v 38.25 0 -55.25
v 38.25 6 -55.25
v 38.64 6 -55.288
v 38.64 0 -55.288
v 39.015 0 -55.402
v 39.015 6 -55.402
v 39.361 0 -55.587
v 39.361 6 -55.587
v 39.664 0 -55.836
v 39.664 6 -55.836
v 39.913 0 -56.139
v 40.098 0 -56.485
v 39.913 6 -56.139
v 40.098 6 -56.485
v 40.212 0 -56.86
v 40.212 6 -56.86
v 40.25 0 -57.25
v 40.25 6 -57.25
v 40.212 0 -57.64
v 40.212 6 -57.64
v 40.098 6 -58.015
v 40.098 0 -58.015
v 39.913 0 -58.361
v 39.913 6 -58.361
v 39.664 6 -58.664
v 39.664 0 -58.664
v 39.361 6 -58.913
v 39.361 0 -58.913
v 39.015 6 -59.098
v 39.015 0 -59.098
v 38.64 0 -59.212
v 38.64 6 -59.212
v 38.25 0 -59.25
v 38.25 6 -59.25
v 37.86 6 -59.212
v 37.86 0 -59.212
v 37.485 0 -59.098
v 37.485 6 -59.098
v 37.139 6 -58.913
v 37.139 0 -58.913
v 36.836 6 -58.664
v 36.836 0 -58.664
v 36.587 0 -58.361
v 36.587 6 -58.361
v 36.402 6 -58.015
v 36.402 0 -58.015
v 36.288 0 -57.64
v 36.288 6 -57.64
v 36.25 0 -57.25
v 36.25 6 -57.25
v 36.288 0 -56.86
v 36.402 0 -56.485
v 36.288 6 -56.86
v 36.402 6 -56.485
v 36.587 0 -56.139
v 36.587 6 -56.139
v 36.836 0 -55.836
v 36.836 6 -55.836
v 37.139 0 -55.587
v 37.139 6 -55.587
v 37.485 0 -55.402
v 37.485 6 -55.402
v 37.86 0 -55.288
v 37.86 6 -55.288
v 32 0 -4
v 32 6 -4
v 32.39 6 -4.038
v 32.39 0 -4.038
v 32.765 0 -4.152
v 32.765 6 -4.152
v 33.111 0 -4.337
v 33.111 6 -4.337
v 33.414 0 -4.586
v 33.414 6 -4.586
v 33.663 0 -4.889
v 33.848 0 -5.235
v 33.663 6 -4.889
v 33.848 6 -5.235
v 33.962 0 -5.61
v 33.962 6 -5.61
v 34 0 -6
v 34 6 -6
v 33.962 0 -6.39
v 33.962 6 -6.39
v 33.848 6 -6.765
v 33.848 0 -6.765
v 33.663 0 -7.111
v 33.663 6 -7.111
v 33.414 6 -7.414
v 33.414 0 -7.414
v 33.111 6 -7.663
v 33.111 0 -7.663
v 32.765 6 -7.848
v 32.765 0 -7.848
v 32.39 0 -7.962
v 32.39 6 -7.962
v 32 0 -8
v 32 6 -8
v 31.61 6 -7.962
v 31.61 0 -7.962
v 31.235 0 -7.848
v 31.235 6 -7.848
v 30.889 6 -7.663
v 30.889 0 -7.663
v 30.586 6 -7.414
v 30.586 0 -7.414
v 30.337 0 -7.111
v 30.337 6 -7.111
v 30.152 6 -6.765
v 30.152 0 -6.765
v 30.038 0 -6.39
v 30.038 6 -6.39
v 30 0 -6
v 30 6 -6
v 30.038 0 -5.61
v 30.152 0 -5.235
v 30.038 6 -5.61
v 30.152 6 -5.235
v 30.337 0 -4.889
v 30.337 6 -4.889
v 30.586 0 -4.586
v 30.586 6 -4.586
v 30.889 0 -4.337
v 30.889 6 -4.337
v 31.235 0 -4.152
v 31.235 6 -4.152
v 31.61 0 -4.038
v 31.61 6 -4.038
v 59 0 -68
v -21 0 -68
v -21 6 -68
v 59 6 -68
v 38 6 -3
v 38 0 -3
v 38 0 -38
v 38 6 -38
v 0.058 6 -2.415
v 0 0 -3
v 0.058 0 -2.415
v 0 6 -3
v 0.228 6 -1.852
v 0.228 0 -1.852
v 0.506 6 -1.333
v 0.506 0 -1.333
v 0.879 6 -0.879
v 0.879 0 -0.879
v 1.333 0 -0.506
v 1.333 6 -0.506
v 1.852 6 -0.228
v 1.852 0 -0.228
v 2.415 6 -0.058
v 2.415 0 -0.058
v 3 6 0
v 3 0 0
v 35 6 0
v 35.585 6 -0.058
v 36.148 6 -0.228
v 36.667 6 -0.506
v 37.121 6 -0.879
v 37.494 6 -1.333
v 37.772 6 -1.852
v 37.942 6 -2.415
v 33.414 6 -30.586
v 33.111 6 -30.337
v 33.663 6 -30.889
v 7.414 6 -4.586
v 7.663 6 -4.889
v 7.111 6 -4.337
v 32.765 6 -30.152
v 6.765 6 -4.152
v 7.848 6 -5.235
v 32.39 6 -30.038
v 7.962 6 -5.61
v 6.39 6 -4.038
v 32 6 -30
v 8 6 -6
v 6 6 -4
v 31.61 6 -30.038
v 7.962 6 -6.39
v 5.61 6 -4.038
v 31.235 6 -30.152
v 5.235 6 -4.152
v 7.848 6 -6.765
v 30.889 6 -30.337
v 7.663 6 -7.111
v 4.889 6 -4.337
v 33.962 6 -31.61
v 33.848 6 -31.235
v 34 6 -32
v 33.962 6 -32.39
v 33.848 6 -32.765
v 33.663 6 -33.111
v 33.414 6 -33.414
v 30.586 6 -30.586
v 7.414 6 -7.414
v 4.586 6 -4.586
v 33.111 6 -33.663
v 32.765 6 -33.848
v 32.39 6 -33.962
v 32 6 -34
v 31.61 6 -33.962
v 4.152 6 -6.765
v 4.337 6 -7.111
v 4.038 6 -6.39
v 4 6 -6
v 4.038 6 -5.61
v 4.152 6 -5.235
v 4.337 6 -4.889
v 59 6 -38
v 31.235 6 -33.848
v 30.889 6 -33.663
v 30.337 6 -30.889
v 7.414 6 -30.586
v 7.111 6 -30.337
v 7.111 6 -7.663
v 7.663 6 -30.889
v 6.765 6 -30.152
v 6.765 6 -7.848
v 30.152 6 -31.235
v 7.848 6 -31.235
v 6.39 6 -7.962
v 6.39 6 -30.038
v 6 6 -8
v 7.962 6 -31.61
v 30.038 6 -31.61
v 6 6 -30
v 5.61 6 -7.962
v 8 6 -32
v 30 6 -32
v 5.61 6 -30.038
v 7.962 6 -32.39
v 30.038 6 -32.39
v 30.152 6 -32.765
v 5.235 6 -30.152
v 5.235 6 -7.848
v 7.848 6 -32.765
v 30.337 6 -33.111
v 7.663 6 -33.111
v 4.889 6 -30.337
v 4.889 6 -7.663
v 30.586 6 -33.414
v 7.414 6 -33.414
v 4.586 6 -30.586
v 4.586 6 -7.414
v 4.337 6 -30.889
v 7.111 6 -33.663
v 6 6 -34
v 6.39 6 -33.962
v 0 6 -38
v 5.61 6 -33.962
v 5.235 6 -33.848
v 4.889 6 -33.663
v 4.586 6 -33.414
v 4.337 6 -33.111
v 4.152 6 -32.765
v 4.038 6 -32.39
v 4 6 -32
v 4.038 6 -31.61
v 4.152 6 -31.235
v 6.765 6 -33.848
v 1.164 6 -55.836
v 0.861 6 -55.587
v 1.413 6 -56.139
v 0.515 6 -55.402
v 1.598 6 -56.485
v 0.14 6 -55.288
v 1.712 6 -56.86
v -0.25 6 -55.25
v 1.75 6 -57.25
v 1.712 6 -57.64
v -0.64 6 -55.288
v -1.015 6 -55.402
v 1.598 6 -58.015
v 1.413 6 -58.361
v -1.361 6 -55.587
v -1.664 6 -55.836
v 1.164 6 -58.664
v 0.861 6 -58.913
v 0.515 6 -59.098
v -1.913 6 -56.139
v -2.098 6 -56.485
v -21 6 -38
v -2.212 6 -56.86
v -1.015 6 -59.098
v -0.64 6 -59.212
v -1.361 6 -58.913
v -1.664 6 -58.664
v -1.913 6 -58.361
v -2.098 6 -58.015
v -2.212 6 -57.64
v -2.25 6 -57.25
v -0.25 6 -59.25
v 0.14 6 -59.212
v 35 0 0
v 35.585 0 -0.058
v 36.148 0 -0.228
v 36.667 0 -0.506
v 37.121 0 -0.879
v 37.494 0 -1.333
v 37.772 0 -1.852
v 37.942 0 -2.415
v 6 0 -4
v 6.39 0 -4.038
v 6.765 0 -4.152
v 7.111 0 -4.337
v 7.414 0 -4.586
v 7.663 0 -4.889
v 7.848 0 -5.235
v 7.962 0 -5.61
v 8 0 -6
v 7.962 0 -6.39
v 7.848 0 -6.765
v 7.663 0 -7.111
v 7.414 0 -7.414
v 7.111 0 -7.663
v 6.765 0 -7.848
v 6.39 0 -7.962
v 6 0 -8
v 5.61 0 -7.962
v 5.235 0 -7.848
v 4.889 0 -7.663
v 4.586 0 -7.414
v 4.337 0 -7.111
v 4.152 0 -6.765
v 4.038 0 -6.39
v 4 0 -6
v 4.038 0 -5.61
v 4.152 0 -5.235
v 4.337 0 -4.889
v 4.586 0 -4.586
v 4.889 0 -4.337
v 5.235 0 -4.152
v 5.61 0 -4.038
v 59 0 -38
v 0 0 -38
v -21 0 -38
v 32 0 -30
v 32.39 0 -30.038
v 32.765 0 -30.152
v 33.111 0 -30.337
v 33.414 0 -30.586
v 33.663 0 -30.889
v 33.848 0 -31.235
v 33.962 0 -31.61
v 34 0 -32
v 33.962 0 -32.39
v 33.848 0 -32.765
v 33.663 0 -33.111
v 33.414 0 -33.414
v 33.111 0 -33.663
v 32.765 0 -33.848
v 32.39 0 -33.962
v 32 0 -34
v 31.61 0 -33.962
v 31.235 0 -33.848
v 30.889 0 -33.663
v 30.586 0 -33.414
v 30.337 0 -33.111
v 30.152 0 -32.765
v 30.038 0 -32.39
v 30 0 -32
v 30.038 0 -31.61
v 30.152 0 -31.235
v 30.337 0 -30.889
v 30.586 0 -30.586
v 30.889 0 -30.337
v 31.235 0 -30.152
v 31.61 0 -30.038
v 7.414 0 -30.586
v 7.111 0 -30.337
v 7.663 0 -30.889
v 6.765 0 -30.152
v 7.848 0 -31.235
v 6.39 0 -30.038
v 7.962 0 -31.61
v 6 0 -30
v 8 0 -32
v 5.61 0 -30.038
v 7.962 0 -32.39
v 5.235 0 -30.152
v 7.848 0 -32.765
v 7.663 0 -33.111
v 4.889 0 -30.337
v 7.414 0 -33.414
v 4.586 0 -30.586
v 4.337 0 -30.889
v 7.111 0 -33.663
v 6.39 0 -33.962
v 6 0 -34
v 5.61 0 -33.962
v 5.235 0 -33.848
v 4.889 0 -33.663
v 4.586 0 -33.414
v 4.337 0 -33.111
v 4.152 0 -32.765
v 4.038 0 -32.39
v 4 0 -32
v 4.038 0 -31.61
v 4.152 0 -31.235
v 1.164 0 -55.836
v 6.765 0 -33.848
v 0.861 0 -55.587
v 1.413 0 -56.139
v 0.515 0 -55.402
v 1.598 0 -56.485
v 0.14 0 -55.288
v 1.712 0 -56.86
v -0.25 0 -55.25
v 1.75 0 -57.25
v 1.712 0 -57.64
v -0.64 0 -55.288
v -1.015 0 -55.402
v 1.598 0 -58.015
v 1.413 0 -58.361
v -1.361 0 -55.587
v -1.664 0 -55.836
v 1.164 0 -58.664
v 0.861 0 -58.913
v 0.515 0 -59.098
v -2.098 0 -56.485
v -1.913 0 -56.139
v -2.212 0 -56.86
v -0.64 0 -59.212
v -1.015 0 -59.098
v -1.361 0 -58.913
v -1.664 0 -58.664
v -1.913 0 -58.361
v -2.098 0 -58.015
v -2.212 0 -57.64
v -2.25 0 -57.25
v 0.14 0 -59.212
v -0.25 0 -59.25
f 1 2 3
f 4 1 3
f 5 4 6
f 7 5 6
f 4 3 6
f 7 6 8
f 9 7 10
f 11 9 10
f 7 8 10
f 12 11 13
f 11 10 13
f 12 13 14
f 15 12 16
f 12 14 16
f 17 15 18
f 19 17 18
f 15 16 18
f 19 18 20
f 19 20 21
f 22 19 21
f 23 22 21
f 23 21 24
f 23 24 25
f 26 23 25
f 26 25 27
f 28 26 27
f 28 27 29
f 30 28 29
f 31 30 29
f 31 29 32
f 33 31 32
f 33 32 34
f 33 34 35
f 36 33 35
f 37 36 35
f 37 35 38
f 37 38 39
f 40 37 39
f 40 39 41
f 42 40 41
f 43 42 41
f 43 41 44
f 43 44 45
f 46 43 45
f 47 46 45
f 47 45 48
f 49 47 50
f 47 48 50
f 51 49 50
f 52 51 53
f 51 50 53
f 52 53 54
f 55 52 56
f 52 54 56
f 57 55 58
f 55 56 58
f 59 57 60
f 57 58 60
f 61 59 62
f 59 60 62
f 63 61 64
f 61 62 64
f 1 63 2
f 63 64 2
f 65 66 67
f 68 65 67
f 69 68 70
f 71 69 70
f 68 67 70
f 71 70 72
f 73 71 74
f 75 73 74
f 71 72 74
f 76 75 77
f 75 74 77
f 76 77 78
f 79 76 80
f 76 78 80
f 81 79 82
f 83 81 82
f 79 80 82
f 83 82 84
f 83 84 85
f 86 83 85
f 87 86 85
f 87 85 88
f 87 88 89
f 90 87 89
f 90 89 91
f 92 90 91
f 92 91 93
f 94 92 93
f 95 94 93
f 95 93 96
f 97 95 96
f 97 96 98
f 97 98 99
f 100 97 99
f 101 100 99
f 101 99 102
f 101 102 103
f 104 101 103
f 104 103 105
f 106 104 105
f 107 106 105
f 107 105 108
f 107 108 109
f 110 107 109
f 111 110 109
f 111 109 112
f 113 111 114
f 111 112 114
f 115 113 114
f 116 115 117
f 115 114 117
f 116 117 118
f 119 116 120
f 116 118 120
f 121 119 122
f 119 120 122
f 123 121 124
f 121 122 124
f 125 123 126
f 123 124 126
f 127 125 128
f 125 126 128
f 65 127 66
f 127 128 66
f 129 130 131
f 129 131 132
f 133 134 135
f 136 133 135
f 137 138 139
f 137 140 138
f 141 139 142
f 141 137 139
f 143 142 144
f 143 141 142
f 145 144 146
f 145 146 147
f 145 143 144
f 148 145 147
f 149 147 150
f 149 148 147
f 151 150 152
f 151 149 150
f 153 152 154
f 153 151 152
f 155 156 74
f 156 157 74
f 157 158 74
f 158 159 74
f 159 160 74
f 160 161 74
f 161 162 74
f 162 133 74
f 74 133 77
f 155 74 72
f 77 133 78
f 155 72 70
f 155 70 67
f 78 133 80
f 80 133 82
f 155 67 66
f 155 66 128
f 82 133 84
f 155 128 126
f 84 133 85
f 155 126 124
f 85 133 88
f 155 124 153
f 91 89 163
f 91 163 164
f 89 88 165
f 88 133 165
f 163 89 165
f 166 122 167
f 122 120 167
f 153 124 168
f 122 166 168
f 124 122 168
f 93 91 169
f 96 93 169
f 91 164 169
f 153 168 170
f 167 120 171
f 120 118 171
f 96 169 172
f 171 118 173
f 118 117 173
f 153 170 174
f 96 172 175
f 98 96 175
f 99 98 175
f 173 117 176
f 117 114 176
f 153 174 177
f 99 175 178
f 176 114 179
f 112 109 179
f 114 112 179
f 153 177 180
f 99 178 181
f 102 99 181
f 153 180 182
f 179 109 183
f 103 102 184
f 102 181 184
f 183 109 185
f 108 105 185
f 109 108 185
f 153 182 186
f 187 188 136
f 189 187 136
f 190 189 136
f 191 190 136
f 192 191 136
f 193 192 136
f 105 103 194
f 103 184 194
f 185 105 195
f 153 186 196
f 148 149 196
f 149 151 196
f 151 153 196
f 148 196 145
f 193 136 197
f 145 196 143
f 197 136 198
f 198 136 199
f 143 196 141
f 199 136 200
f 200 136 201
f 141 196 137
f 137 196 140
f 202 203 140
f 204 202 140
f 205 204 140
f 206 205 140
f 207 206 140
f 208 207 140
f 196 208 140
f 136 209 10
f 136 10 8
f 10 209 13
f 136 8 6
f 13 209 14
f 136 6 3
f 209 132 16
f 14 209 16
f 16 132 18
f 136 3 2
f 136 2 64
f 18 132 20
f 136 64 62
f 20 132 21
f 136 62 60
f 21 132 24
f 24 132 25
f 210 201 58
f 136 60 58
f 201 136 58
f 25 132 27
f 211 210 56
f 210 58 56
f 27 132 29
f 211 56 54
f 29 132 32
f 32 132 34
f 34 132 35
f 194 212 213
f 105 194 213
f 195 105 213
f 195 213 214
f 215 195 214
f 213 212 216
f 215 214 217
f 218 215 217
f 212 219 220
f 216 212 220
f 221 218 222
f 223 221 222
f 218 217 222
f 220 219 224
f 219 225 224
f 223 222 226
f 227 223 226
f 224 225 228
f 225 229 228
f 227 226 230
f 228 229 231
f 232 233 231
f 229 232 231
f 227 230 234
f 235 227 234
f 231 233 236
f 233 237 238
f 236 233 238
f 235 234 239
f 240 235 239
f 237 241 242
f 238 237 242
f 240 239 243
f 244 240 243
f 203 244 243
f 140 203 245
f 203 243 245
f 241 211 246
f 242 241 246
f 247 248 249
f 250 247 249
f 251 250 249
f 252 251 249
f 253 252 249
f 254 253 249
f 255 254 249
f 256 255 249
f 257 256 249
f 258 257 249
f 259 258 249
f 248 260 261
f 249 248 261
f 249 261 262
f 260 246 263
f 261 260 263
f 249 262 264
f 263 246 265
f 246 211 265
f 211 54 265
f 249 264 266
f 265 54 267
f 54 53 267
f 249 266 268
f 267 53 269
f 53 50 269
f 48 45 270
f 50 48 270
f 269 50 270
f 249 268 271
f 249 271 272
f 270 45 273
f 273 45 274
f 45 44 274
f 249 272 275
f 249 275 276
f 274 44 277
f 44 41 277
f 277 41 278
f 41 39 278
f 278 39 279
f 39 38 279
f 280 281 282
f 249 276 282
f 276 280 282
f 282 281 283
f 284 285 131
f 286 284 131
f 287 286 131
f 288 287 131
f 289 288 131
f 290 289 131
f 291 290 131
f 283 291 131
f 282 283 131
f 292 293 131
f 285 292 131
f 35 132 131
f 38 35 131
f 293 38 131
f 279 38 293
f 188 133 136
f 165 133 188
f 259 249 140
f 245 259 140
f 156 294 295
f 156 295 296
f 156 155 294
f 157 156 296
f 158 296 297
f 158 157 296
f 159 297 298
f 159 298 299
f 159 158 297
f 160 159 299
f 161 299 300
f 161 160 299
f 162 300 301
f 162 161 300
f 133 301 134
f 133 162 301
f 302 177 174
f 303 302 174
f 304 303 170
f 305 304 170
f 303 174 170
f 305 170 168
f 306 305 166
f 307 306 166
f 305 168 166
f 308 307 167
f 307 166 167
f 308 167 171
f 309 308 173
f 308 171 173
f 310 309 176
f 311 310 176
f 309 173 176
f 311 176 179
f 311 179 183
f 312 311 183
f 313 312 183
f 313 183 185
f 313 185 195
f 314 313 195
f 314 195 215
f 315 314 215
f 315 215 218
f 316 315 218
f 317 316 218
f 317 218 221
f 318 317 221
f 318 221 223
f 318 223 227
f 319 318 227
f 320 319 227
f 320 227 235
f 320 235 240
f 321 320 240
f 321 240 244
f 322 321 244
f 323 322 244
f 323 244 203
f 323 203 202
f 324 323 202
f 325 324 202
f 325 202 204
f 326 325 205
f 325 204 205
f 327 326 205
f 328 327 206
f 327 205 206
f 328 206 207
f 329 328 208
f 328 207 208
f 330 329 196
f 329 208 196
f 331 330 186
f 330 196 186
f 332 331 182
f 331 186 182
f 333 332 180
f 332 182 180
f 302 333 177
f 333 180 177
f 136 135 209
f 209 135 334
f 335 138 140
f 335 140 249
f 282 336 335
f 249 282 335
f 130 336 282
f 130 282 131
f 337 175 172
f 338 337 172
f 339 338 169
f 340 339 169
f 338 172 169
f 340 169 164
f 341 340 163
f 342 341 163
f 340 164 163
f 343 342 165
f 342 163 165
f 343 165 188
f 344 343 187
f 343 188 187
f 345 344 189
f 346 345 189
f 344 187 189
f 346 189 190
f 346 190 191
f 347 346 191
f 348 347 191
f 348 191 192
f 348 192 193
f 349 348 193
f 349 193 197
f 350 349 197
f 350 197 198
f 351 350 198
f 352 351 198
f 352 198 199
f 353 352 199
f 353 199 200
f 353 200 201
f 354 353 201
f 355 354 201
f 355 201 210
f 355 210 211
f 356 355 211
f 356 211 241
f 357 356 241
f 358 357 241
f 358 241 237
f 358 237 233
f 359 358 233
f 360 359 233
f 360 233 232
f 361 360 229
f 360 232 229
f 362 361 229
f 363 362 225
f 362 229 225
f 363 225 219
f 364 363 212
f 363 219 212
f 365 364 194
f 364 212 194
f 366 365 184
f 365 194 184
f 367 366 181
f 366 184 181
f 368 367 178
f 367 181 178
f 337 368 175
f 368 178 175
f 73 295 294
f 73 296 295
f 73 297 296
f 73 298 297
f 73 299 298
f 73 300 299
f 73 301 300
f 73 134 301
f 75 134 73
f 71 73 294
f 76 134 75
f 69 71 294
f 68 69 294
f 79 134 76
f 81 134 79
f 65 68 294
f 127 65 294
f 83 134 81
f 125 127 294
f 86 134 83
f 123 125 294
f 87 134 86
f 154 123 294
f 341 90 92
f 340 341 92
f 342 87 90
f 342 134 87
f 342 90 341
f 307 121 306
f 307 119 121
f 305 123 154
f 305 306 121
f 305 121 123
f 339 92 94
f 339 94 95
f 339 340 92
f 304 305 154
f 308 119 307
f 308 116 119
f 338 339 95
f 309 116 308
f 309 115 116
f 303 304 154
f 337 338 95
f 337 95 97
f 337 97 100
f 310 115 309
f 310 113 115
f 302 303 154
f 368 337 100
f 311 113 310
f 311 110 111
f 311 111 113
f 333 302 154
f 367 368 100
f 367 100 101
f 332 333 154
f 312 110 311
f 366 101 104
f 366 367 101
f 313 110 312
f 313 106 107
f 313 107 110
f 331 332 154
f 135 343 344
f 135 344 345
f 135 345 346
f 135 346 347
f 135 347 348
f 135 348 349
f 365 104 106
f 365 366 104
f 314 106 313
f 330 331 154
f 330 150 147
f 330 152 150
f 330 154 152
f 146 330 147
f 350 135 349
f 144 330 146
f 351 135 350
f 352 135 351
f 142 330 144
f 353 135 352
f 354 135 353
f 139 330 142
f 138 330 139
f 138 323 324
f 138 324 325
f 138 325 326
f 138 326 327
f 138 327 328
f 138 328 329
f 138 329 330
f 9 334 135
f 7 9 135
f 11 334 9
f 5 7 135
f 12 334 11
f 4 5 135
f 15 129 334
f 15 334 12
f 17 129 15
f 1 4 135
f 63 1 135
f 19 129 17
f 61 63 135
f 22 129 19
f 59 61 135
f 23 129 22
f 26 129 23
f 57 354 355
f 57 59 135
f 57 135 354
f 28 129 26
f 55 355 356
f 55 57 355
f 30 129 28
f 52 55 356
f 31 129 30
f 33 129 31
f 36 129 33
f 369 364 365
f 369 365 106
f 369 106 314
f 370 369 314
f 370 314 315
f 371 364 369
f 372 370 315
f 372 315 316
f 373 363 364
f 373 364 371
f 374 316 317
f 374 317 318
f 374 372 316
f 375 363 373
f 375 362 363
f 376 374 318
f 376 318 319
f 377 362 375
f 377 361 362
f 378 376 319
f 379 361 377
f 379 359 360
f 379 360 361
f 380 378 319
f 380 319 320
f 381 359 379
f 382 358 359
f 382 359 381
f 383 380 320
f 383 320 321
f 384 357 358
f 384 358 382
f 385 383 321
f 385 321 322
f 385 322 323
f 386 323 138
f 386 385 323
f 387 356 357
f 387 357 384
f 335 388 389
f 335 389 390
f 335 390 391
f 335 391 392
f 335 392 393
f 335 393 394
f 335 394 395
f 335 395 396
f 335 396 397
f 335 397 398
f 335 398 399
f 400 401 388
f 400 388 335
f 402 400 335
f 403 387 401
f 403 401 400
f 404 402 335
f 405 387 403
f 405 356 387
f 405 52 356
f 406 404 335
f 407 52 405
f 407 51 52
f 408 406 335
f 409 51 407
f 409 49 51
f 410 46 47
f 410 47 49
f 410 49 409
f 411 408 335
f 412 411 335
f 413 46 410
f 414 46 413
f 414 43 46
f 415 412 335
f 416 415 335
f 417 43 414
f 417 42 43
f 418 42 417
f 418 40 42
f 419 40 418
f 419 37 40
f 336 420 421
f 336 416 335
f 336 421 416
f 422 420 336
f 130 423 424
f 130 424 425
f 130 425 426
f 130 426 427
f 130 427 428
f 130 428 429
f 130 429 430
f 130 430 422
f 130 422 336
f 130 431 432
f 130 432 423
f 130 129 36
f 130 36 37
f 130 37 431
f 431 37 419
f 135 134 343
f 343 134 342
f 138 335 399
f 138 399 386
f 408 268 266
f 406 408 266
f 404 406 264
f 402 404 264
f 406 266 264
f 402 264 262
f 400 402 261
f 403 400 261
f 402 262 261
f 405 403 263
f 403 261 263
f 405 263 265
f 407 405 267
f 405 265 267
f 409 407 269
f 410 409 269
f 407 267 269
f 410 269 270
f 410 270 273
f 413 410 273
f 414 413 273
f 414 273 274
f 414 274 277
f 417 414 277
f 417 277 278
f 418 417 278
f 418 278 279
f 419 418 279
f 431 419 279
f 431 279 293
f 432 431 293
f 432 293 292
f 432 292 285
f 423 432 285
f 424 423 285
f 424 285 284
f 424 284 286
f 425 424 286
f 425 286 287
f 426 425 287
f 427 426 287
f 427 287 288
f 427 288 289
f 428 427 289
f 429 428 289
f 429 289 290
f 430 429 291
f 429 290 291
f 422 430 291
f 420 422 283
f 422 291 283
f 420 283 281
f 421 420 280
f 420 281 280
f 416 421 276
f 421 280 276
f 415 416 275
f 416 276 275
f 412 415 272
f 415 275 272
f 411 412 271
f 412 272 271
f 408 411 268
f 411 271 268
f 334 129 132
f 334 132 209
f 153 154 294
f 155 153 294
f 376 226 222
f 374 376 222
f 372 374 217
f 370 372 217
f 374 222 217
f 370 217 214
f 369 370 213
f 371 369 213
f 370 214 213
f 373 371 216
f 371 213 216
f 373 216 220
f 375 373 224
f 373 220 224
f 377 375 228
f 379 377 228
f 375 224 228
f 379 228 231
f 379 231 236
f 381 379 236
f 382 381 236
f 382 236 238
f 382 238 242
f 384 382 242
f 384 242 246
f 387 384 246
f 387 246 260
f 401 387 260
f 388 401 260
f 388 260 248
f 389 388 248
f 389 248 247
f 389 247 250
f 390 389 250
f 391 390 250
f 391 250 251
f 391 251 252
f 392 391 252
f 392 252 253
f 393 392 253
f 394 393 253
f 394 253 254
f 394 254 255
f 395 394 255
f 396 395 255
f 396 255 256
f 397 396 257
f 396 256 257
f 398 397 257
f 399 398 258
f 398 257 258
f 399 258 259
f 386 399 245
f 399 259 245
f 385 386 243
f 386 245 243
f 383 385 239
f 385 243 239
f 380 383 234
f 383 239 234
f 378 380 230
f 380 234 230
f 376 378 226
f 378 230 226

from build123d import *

# Parameters (mm, degrees)
SKETCH1_W            = 38
SKETCH1_H            = 38
BOSS_EXTRUDE1_DEPTH  = 6
SKETCH2_R            = 2
CUT_EXTRUDE1_DEPTH   = 55.074023338
LPATTERN1_COUNT      = 2
LPATTERN1_PITCH      = 26
LPATTERN1_COUNT_DIR2 = 2
LPATTERN1_PITCH_DIR2 = 26
FILLET1_R            = 3
BOSS_EXTRUDE2_DEPTH  = 6
SKETCH4_R            = 2
CUT_EXTRUDE2_DEPTH   = 91.227490268


with BuildPart() as part:
    # Sketch1 → Boss-Extrude1 (new body)
    with BuildSketch(Plane(origin=(0, 0, 0), x_dir=(1, 0, 0), z_dir=(0, 1, 0))):
        with Locations((19, 19)):
            Rectangle(SKETCH1_W, SKETCH1_H)
    extrude(amount=BOSS_EXTRUDE1_DEPTH)

    # Sketch2 → Cut-Extrude1 (cut, through all)
    with BuildSketch(Plane(origin=(0, 6, 0), x_dir=(1, 0, 0), z_dir=(0, 1, 0))):
        with Locations(Location((6, 32, 0), (0, 0, 270))):
            Circle(SKETCH2_R)
    cut_extrude1 = extrude(amount=-CUT_EXTRUDE1_DEPTH, mode=Mode.SUBTRACT)

    # LPattern1: Cut-Extrude1 2 × 2
    with Locations(*[(i * LPATTERN1_PITCH, 0, j * LPATTERN1_PITCH_DIR2) for i in range(LPATTERN1_COUNT) for j in range(LPATTERN1_COUNT_DIR2) if (i, j) != (0, 0)]):
        add(cut_extrude1, mode=Mode.SUBTRACT)

    # Fillet1
    fillet1_edges = [part.edges().sort_by_distance(p)[0] for p in [
        (38, 3, 0),
        (0, 3, 0),
    ]]
    fillet(fillet1_edges, radius=FILLET1_R)

    # Sketch3 → Boss-Extrude2 (add)
    with BuildSketch(Plane(origin=(0, 0, 0), x_dir=(1, 0, 0), z_dir=(0, 1, 0))):
        Polygon((0, 38), (-21, 38), (-21, 68), (59, 68), (59, 38), (38, 38), align=None)
    extrude(amount=BOSS_EXTRUDE2_DEPTH)

    # Sketch4 → Cut-Extrude2 (cut, through all)
    with BuildSketch(Plane(origin=(0, 6, 0), x_dir=(1, 0, 0), z_dir=(0, 1, 0))):
        with Locations(Location((-0.25, 57.25, 0), (0, 0, 270))):
            Circle(SKETCH4_R)
        with Locations(Location((38.25, 57.25, 0), (0, 0, 270))):
            Circle(SKETCH4_R)
    extrude(amount=-CUT_EXTRUDE2_DEPTH, mode=Mode.SUBTRACT)


solid = part.part
